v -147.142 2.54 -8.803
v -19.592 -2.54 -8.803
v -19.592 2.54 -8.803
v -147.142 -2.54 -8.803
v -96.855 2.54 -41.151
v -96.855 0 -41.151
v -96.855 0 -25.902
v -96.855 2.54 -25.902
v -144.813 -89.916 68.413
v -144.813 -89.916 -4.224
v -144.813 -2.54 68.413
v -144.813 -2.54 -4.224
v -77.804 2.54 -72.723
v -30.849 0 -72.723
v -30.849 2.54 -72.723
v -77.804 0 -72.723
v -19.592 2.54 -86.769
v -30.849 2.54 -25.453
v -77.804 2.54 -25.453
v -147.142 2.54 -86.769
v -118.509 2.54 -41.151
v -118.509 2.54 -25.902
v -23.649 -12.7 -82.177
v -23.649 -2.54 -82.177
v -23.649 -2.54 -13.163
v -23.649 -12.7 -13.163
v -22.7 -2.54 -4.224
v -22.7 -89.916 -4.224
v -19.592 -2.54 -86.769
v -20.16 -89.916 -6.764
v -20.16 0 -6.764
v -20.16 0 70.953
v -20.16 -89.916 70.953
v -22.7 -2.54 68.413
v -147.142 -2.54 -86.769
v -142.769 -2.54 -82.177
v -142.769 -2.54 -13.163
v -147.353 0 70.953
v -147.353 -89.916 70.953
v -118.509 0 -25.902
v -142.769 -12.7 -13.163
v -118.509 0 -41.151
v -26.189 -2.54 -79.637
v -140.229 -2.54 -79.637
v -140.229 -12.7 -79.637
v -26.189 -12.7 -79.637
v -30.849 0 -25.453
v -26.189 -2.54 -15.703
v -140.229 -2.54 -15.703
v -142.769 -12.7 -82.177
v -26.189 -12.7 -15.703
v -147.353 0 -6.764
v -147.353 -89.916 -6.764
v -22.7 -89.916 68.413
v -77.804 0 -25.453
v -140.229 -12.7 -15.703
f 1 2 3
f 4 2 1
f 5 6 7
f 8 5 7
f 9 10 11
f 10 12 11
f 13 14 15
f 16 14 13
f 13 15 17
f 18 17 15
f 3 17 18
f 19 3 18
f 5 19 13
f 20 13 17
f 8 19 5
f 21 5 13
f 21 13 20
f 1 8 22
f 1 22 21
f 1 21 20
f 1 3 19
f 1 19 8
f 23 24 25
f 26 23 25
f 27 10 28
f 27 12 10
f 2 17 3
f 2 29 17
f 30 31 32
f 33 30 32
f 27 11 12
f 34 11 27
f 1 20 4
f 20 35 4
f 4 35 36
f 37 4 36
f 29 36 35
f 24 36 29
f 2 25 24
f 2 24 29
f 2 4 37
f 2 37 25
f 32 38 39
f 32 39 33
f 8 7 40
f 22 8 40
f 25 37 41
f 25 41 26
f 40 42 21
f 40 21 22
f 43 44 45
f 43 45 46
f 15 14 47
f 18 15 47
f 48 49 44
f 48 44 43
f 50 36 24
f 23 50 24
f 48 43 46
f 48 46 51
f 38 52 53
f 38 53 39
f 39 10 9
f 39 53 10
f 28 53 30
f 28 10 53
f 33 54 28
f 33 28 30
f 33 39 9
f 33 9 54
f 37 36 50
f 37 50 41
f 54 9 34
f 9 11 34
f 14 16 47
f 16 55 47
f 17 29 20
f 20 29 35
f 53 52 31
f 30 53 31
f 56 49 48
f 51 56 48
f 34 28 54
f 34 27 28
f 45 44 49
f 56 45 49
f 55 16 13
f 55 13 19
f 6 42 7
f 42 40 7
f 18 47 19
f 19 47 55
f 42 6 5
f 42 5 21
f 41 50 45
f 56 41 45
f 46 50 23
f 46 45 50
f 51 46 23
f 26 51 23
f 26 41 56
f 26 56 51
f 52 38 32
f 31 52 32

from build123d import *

# Parameters (mm, degrees)
F0_W        = 127.1928735077
F0_H        = 77.7173149399
F1_DEPTH    = 89.916
F2_T        = -2.54
F3_W        = 127.5507546961
F3_H        = 77.9658099636
F4_DEPTH    = 2.54
F5_W        = 119.1201396286
F5_H        = 69.0140379593
F6_DEPTH    = 10.16
F9_T        = 2.54
F9_T3_DEPTH = 124.2001396286
F9_T5_DEPTH = 74.0940379593
F8_W        = 127.5507546961
F8_H        = 77.9658099636
F8_W_2      = 46.9547603279
F8_H_2      = 47.2698919475
F8_W_3      = 21.6541066766
F8_H_3      = 15.249369666
F10_DEPTH   = 2.54


# Not quite as in the source:
# - a shell that OpenCascade refuses in one call is made with other operations: the cavity is built on its own and cut out


with BuildPart() as f1:
    # F0 (on Front) → F1 (new body)
    with BuildSketch(Plane.XZ):
        with Locations((-83.7561842054, 32.0948308799)):
            Rectangle(F0_W, F0_H)
    extrude(amount=F1_DEPTH)

    # F2
    f2_openings = [f1.faces().sort_by_distance(p)[0] for p in [
        (-83.756184, -89.916, 32.094831),
    ]]
    offset(amount=F2_T, openings=f2_openings)


with BuildPart() as f4:
    # F3 (on Front) → F4 (new body)
    with BuildSketch(Plane.XZ):
        with Locations((-83.3670627326, -47.7856700309)):
            Rectangle(F3_W, F3_H)
    extrude(amount=F4_DEPTH)

    # F5 (on face) → F6 (join)
    with BuildSketch(Plane.XZ.offset(2.54)):
        with Locations((-83.2092221826, -47.6696216501)):
            Rectangle(F5_W, F5_H)
    extrude(amount=F6_DEPTH)

    # F9: shell of thickness 2.54, made by hand


with BuildPart() as f9_core1:
    # F9_t2: copy of F4
    add(f4.part)

    # the walls: a layer under each face that stays
    f9_faces = [f9_core1.faces().sort_by_distance(p)[0] for p in [
        (-83.3670627326, -1.27, -8.802765049),
        (-19.5916853845, -1.27, -47.7856700309),
        (-147.1424400806, -1.27, -47.7856700309),
        (-83.3670627326, 0, -47.7856700309),
        (-142.8907482574, -2.54, -84.1697146806),
        (-83.3670627326, -1.27, -86.7685750127),
        (-83.2092221826, -7.62, -13.1626026705),
        (-142.769291997, -7.62, -47.6696216501),
        (-83.2092221826, -7.62, -82.1766406298),
        (-23.6491523683, -7.62, -47.6696216501),
    ]]
    thicken(f9_faces, amount=-F9_T, mode=Mode.SUBTRACT)

    # F9_s4 → F9_t3 (cut)
    with BuildSketch(Plane.YZ.offset(-145.309291997)):
        Polygon((-2.5654, -13.1372026705), (0, -13.1626026705), (0, -15.7026026705), (-2.54, -15.7026026705), align=None)
        Polygon((-2.5654, -82.2020406298), (0, -82.1766406298), (0, -79.6366406298), (-2.54, -79.6366406298), align=None)
    extrude(amount=F9_T3_DEPTH, mode=Mode.SUBTRACT)

    # F9_s6 → F9_t5 (cut)
    with BuildSketch(Plane.XY.offset(-84.7166406298)):
        Polygon((-142.794691997, -2.5654), (-142.769291997, 0), (-140.229291997, 0), (-140.229291997, -2.54), align=None)
        Polygon((-23.6237523683, -2.5654), (-23.6491523683, 0), (-26.1891523683, 0), (-26.1891523683, -2.54), align=None)
    extrude(amount=F9_T5_DEPTH, mode=Mode.SUBTRACT)


with BuildPart() as f4_1:
    add(f4.part)

    # what is left inside the walls is the cavity
    f9_cavity = [f9_core1.part.solids().sort_by_distance(p)[0] for p in [
        (-83.209222, -2.5654, -58.325295),
    ]]
    add(f9_cavity, mode=Mode.SUBTRACT)

    # F8 (on face) → F10 (join)
    with BuildSketch(Plane(origin=(0, 0, 0), x_dir=(-1, 0, 0), z_dir=(0, 1, 0))):
        with Locations((83.3670627326, -47.7856700309)):
            Rectangle(F8_W, F8_H)
        with Locations((54.326700978, -49.0877199918)):
            Rectangle(F8_W_2, F8_H_2, mode=Mode.SUBTRACT)
        with Locations((107.682403177, -33.5264848545)):
            Rectangle(F8_W_3, F8_H_3, mode=Mode.SUBTRACT)
    extrude(amount=F10_DEPTH)


solid = Compound([f1.part, f4_1.part])
